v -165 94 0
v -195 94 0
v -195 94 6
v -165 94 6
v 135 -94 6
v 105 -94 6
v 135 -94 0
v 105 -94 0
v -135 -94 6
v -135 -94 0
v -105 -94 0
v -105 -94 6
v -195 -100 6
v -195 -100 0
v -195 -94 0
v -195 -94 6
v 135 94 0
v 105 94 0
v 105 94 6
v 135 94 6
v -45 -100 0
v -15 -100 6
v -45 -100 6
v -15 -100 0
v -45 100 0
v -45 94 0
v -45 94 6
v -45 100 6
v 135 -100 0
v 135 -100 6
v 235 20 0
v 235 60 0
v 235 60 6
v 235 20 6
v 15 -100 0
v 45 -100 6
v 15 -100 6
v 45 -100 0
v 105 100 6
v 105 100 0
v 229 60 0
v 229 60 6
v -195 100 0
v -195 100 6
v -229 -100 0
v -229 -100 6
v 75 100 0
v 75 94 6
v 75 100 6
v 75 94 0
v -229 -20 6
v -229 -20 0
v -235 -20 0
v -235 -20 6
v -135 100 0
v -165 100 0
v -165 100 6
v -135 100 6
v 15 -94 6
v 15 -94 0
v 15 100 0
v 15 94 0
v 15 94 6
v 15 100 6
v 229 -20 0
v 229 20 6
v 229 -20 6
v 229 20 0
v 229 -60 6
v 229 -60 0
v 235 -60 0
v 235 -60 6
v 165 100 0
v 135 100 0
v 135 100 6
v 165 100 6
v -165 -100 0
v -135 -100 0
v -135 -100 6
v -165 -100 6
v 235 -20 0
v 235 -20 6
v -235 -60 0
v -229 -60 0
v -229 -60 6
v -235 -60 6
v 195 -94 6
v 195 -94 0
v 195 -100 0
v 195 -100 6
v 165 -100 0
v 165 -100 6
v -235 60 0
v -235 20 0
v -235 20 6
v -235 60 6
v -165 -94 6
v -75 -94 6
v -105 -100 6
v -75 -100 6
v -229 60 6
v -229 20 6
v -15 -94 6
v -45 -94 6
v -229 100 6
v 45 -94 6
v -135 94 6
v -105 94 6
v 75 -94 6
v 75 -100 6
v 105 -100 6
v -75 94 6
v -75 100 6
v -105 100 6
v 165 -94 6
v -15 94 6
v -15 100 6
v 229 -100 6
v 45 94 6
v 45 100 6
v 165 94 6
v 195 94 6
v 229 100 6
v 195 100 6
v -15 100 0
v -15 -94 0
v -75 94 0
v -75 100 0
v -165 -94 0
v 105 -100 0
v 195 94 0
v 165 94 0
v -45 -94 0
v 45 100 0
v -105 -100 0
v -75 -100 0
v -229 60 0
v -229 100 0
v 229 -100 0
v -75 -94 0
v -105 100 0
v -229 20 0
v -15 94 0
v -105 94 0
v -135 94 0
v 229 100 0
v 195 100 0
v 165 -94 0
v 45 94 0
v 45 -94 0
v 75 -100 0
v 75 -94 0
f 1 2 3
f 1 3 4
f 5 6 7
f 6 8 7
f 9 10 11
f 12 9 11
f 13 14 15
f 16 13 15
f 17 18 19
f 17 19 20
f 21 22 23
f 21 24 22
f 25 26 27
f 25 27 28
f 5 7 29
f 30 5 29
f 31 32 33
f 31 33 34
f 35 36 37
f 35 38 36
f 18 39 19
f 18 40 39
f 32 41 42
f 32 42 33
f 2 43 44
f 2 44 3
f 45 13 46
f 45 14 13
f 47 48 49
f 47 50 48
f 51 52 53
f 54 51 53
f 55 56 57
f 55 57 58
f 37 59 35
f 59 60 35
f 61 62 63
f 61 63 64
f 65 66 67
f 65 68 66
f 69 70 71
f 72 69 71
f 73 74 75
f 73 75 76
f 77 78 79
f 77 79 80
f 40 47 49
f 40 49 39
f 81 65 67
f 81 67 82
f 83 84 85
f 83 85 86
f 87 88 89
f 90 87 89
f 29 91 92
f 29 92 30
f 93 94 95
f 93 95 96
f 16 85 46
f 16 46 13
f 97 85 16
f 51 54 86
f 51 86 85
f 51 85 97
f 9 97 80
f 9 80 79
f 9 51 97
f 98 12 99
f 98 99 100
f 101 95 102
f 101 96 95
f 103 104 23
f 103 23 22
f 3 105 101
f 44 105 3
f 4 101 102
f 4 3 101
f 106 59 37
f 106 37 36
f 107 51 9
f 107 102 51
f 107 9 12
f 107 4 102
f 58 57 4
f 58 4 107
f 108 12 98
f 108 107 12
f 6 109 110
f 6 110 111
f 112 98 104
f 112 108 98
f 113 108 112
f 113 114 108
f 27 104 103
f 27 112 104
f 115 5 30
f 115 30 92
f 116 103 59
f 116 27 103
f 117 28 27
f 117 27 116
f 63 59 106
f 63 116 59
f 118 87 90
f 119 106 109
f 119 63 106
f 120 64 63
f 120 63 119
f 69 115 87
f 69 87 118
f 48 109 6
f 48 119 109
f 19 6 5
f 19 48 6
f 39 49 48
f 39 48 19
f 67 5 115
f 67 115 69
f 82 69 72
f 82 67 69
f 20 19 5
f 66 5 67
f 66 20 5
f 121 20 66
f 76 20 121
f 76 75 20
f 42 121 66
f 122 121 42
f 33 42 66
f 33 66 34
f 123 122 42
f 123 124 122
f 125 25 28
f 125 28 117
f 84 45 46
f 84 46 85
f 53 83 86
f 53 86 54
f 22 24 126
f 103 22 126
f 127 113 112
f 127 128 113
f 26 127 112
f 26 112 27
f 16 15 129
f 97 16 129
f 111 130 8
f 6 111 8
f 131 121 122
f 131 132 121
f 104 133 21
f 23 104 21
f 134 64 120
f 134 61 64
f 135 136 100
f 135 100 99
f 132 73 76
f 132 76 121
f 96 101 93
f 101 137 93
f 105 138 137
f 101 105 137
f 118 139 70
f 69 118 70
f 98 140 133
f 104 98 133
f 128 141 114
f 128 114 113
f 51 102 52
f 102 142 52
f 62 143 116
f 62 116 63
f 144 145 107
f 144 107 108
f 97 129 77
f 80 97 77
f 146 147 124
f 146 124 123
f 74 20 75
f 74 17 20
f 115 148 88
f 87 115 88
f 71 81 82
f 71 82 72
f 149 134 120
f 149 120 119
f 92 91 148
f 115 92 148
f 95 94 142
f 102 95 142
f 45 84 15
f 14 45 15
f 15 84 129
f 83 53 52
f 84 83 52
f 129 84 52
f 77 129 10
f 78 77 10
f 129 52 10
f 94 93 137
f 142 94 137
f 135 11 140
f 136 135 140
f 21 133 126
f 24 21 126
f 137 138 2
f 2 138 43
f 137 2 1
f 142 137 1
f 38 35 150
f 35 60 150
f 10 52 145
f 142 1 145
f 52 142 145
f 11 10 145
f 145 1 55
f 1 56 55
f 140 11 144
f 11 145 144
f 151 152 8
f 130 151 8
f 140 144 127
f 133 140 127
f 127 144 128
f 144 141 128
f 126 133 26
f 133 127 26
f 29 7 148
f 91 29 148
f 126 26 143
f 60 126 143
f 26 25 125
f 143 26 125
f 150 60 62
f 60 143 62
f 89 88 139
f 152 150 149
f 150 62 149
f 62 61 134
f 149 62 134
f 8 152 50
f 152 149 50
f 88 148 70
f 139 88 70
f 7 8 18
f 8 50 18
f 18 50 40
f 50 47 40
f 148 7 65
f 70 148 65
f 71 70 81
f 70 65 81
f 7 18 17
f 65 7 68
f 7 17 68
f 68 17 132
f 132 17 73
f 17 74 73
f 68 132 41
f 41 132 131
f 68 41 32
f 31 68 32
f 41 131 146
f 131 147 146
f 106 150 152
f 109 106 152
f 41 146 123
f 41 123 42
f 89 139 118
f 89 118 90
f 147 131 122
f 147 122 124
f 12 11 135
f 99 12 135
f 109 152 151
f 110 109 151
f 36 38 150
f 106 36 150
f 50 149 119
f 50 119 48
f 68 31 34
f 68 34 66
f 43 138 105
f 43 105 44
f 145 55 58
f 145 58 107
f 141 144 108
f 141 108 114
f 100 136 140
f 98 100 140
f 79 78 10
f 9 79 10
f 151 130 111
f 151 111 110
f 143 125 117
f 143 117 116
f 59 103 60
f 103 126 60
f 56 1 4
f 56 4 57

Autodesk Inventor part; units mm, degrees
ref_plane "YZ Plane" through (0, 0, 0) normal (1, 0, 0) x (0, 1, 0)
ref_plane "XZ Plane" through (0, 0, 0) normal (0, 1, 0) x (-1, 0, 0)
ref_plane "XY Plane" through (0, 0, 0) normal (0, 0, 1) x (1, 0, 0)
sketch "Sketch1" plane through (0, 0, 0) normal (0, 0, 1) x (1, 0, 0)
  line L0 (-235, 100) -> (235, 100)
  line L1 (235, 100) -> (235, -100)
  line L2 (235, -100) -> (-235, -100)
  line L3 (-235, -100) -> (-235, 100)
  line L4 (-235, 100) -> (235, -100) construction
  line L5 (235, 100) -> (-235, -100) construction
  line L6 (-15, 94) -> (15, 94)
  line L7 (15, 94) -> (15, 100)
  line L8 (15, 100) -> (-15, 100)
  line L9 (-15, 100) -> (-15, 94)
  line L10 (-15, 94) -> (15, 100) construction
  line L11 (15, 94) -> (-15, 100) construction
  line L12 (45, 94) -> (75, 94)
  line L13 (75, 94) -> (75, 100)
  line L14 (75, 100) -> (45, 100)
  line L15 (45, 100) -> (45, 94)
  line L16 (45, 94) -> (75, 100) construction
  line L17 (75, 94) -> (45, 100) construction
  line L18 (105, 94) -> (135, 94)
  line L19 (135, 94) -> (135, 100)
  line L20 (135, 100) -> (105, 100)
  line L21 (105, 100) -> (105, 94)
  line L22 (105, 94) -> (135, 100) construction
  line L23 (135, 94) -> (105, 100) construction
  line L24 (165, 94) -> (195, 94)
  line L25 (195, 94) -> (195, 100)
  line L26 (195, 100) -> (165, 100)
  line L27 (165, 100) -> (165, 94)
  line L28 (165, 94) -> (195, 100) construction
  line L29 (195, 94) -> (165, 100) construction
  line L30 (-75, 94) -> (-45, 94)
  line L31 (-45, 94) -> (-45, 100)
  line L32 (-45, 100) -> (-75, 100)
  line L33 (-75, 100) -> (-75, 94)
  line L34 (-75, 94) -> (-45, 100) construction
  line L35 (-45, 94) -> (-75, 100) construction
  line L36 (-15, 94) -> (15, 94)
  line L37 (15, 94) -> (15, 100)
  line L38 (15, 100) -> (-15, 100)
  line L39 (-15, 100) -> (-15, 94)
  line L40 (-15, 94) -> (15, 100) construction
  line L41 (15, 94) -> (-15, 100) construction
  line L42 (45, 94) -> (75, 94)
  line L43 (75, 94) -> (75, 100)
  line L44 (75, 100) -> (45, 100)
  line L45 (45, 100) -> (45, 94)
  line L46 (45, 94) -> (75, 100) construction
  line L47 (75, 94) -> (45, 100) construction
  line L48 (105, 94) -> (135, 94)
  line L49 (135, 94) -> (135, 100)
  line L50 (135, 100) -> (105, 100)
  line L51 (105, 100) -> (105, 94)
  line L52 (105, 94) -> (135, 100) construction
  line L53 (135, 94) -> (105, 100) construction
  line L54 (-135, 94) -> (-105, 94)
  line L55 (-105, 94) -> (-105, 100)
  line L56 (-105, 100) -> (-135, 100)
  line L57 (-135, 100) -> (-135, 94)
  line L58 (-135, 94) -> (-105, 100) construction
  line L59 (-105, 94) -> (-135, 100) construction
  line L60 (-75, 94) -> (-45, 94)
  line L61 (-45, 94) -> (-45, 100)
  line L62 (-45, 100) -> (-75, 100)
  line L63 (-75, 100) -> (-75, 94)
  line L64 (-75, 94) -> (-45, 100) construction
  line L65 (-45, 94) -> (-75, 100) construction
  line L66 (-15, 94) -> (15, 94)
  line L67 (15, 94) -> (15, 100)
  line L68 (15, 100) -> (-15, 100)
  line L69 (-15, 100) -> (-15, 94)
  line L70 (-15, 94) -> (15, 100) construction
  line L71 (15, 94) -> (-15, 100) construction
  line L72 (45, 94) -> (75, 94)
  line L73 (75, 94) -> (75, 100)
  line L74 (75, 100) -> (45, 100)
  line L75 (45, 100) -> (45, 94)
  line L76 (45, 94) -> (75, 100) construction
  line L77 (75, 94) -> (45, 100) construction
  line L78 (-195, 94) -> (-165, 94)
  line L79 (-165, 94) -> (-165, 100)
  line L80 (-165, 100) -> (-195, 100)
  line L81 (-195, 100) -> (-195, 94)
  line L82 (-195, 94) -> (-165, 100) construction
  line L83 (-165, 94) -> (-195, 100) construction
  line L84 (-135, 94) -> (-105, 94)
  line L85 (-105, 94) -> (-105, 100)
  line L86 (-105, 100) -> (-135, 100)
  line L87 (-135, 100) -> (-135, 94)
  line L88 (-135, 94) -> (-105, 100) construction
  line L89 (-105, 94) -> (-135, 100) construction
  line L90 (-75, 94) -> (-45, 94)
  line L91 (-45, 94) -> (-45, 100)
  line L92 (-45, 100) -> (-75, 100)
  line L93 (-75, 100) -> (-75, 94)
  line L94 (-75, 94) -> (-45, 100) construction
  line L95 (-45, 94) -> (-75, 100) construction
  line L96 (-15, 94) -> (15, 94)
  line L97 (15, 94) -> (15, 100)
  line L98 (15, 100) -> (-15, 100)
  line L99 (-15, 100) -> (-15, 94)
  line L100 (-15, 94) -> (15, 100) construction
  line L101 (15, 94) -> (-15, 100) construction
  line L102 (229, -20) -> (235, -20)
  line L103 (235, -20) -> (235, 20)
  line L104 (235, 20) -> (229, 20)
  line L105 (229, 20) -> (229, -20)
  line L106 (229, -20) -> (235, 20) construction
  line L107 (235, -20) -> (229, 20) construction
  line L108 (235, 100) -> (229, 100)
  line L109 (229, 100) -> (229, 60)
  line L110 (229, 60) -> (235, 60)
  line L111 (235, 60) -> (235, 100)
  line L112 (235, -100) -> (229, -100)
  line L113 (229, -100) -> (229, -60)
  line L114 (229, -60) -> (235, -60)
  line L115 (235, -60) -> (235, -100)
  line L116 (0, 100) -> (0, -100) construction
  line L117 (235, 0) -> (-235, 0) construction
  line L118 (-229, -20) -> (-235, -20)
  line L119 (-235, -20) -> (-235, 20)
  line L120 (-235, 20) -> (-229, 20)
  line L121 (-229, 20) -> (-229, -20)
  line L122 (-229, -20) -> (-235, 20) construction
  line L123 (-235, -20) -> (-229, 20) construction
  line L124 (-235, 100) -> (-229, 100)
  line L125 (-229, 100) -> (-229, 60)
  line L126 (-229, 60) -> (-235, 60)
  line L127 (-235, 60) -> (-235, 100)
  line L128 (-235, -100) -> (-229, -100)
  line L129 (-229, -100) -> (-229, -60)
  line L130 (-229, -60) -> (-235, -60)
  line L131 (-235, -60) -> (-235, -100)
  line L132 (-15, -94) -> (15, -94)
  line L133 (15, -94) -> (15, -100)
  line L134 (15, -100) -> (-15, -100)
  line L135 (-15, -100) -> (-15, -94)
  line L136 (-15, -94) -> (15, -100) construction
  line L137 (15, -94) -> (-15, -100) construction
  line L138 (45, -100) -> (45, -94)
  line L139 (45, -94) -> (75, -94)
  line L140 (75, -100) -> (45, -100)
  line L141 (45, -94) -> (75, -100) construction
  line L142 (75, -94) -> (45, -100) construction
  line L143 (75, -94) -> (75, -100)
  line L144 (105, -100) -> (105, -94)
  line L145 (105, -94) -> (135, -94)
  line L146 (135, -100) -> (105, -100)
  line L147 (105, -94) -> (135, -100) construction
  line L148 (135, -94) -> (105, -100) construction
  line L149 (135, -94) -> (135, -100)
  line L150 (165, -100) -> (165, -94)
  line L151 (165, -94) -> (195, -94)
  line L152 (195, -100) -> (165, -100)
  line L153 (165, -94) -> (195, -100) construction
  line L154 (195, -94) -> (165, -100) construction
  line L155 (195, -94) -> (195, -100)
  line L156 (-75, -100) -> (-75, -94)
  line L157 (-75, -94) -> (-45, -94)
  line L158 (-45, -100) -> (-75, -100)
  line L159 (-75, -94) -> (-45, -100) construction
  line L160 (-45, -94) -> (-75, -100) construction
  line L161 (-45, -94) -> (-45, -100)
  line L162 (-15, -100) -> (-15, -94)
  line L163 (-15, -94) -> (15, -94)
  line L164 (15, -100) -> (-15, -100)
  line L165 (-15, -94) -> (15, -100) construction
  line L166 (15, -94) -> (-15, -100) construction
  line L167 (15, -94) -> (15, -100)
  line L168 (45, -100) -> (45, -94)
  line L169 (45, -94) -> (75, -94)
  line L170 (75, -100) -> (45, -100)
  line L171 (45, -94) -> (75, -100) construction
  line L172 (75, -94) -> (45, -100) construction
  line L173 (75, -94) -> (75, -100)
  line L174 (105, -100) -> (105, -94)
  line L175 (105, -94) -> (135, -94)
  line L176 (135, -100) -> (105, -100)
  line L177 (105, -94) -> (135, -100) construction
  line L178 (135, -94) -> (105, -100) construction
  line L179 (135, -94) -> (135, -100)
  line L180 (-135, -100) -> (-135, -94)
  line L181 (-135, -94) -> (-105, -94)
  line L182 (-105, -100) -> (-135, -100)
  line L183 (-135, -94) -> (-105, -100) construction
  line L184 (-105, -94) -> (-135, -100) construction
  line L185 (-105, -94) -> (-105, -100)
  line L186 (-75, -100) -> (-75, -94)
  line L187 (-75, -94) -> (-45, -94)
  line L188 (-45, -100) -> (-75, -100)
  line L189 (-75, -94) -> (-45, -100) construction
  line L190 (-45, -94) -> (-75, -100) construction
  line L191 (-45, -94) -> (-45, -100)
  line L192 (-15, -100) -> (-15, -94)
  line L193 (-15, -94) -> (15, -94)
  line L194 (15, -100) -> (-15, -100)
  line L195 (-15, -94) -> (15, -100) construction
  line L196 (15, -94) -> (-15, -100) construction
  line L197 (15, -94) -> (15, -100)
  line L198 (45, -100) -> (45, -94)
  line L199 (45, -94) -> (75, -94)
  line L200 (75, -100) -> (45, -100)
  line L201 (45, -94) -> (75, -100) construction
  line L202 (75, -94) -> (45, -100) construction
  line L203 (75, -94) -> (75, -100)
  line L204 (-195, -100) -> (-195, -94)
  line L205 (-195, -94) -> (-165, -94)
  line L206 (-165, -100) -> (-195, -100)
  line L207 (-195, -94) -> (-165, -100) construction
  line L208 (-165, -94) -> (-195, -100) construction
  line L209 (-165, -94) -> (-165, -100)
  line L210 (-135, -100) -> (-135, -94)
  line L211 (-135, -94) -> (-105, -94)
  line L212 (-105, -100) -> (-135, -100)
  line L213 (-135, -94) -> (-105, -100) construction
  line L214 (-105, -94) -> (-135, -100) construction
  line L215 (-105, -94) -> (-105, -100)
  line L216 (-75, -100) -> (-75, -94)
  line L217 (-75, -94) -> (-45, -94)
  line L218 (-45, -100) -> (-75, -100)
  line L219 (-75, -94) -> (-45, -100) construction
  line L220 (-45, -94) -> (-75, -100) construction
  line L221 (-45, -94) -> (-45, -100)
  line L222 (-15, -100) -> (-15, -94)
  line L223 (-15, -94) -> (15, -94)
  line L224 (15, -100) -> (-15, -100)
  line L225 (-15, -94) -> (15, -100) construction
  line L226 (15, -94) -> (-15, -100) construction
  line L227 (15, -94) -> (15, -100)
  point P0 (0, 0)
  point P1 (0, 97)
  point P2 (0, 97)
  point P3 (0, 0)
  point P4 (60, 97)
  point P5 (60, 97)
  point P6 (120, 97)
  point P7 (120, 97)
  point P8 (180, 97)
  point P9 (180, 97)
  point P10 (-60, 97)
  point P11 (-60, 97)
  point P12 (0, 97)
  point P13 (0, 97)
  point P14 (60, 97)
  point P15 (60, 97)
  point P16 (120, 97)
  point P17 (120, 97)
  point P18 (-120, 97)
  point P19 (-120, 97)
  point P20 (-60, 97)
  point P21 (-60, 97)
  point P22 (0, 97)
  point P23 (0, 97)
  point P24 (60, 97)
  point P25 (60, 97)
  point P26 (-180, 97)
  point P27 (-180, 97)
  point P28 (-120, 97)
  point P29 (-120, 97)
  point P30 (-60, 97)
  point P31 (-60, 97)
  point P32 (0, 97)
  point P33 (0, 97)
  point P34 (232, 0)
  point P35 (232, 0)
  point P36 (0, 0)
  point P37 (-232, 0)
  point P38 (-232, 0)
  point P39 (0, -97)
  point P40 (60, -100)
  point P41 (60, -97)
  point P42 (120, -100)
  point P43 (120, -97)
  point P44 (180, -100)
  point P45 (180, -97)
  point P46 (-60, -100)
  point P47 (-60, -97)
  point P48 (0, -97)
  point P49 (60, -100)
  point P50 (60, -97)
  point P51 (120, -100)
  point P52 (120, -97)
  point P53 (-120, -100)
  point P54 (-120, -97)
  point P55 (-60, -100)
  point P56 (-60, -97)
  point P57 (0, -97)
  point P58 (60, -100)
  point P59 (60, -97)
  point P60 (-180, -100)
  point P61 (-180, -97)
  point P62 (-120, -100)
  point P63 (-120, -97)
  point P64 (-60, -100)
  point P65 (-60, -97)
  point P66 (0, -97)
  point P67 (0, 85)
  point P68 (0, 100)
  dimension "d0" = 470
  dimension "d1" = 200
  dimension "d2" = 6
  dimension "d3" = 30
  dimension "d6" = 60
  dimension "d9" = 60
  dimension "d12" = 6
  dimension "d13" = 40
  dimension "d14" = 6
  dimension "d15" = 40
  dimension "d16" = 6
  dimension "d17" = 40
  dimension "d20" = 60
  dimension "d23" = 60
extrude "Plate1" add sketch "Sketch1" along normal blind 6 contours L0 L81 L78 L79 L57 L54 L55 L33 L30 L31 L9 L6 L7 L15 L12 L13 L21 L18 L19 L27 L24 L25 L109 L110 L1 L104 L105 L102 L114 L113 L2 L155 L151 L150 L149 L145 L144 L143 L139 L138 L133 L132 L135 L161 L157 L156 L185 L181 L180 L209 L205 L204 L129 L130 L3 L118 L121 L120 L126 L125
equation "\"d12\" = d2"
equation "\"d15\" = d13"
equation "\"d33\" = Thickness"
equation "\"BendRadius\" = Thickness"
equation "\"BendReliefWidth\" = Thickness"
equation "\"BendReliefDepth\" = 0.5 * Thickness"
equation "\"CornerReliefSize\" = 4 * Thickness"
equation "\"MinimumRemnant\" = 2 * Thickness"
equation "\"TransitionRadius\" = BendRadius"
equation "\"JacobiRadiusSize\" = BendRadius"
equation "\"GapSize\" = Thickness"
equation "\"Thickness\" = 6"
properties part number "bovenplaat elektrobox v2" material "Wood (Birch)"
